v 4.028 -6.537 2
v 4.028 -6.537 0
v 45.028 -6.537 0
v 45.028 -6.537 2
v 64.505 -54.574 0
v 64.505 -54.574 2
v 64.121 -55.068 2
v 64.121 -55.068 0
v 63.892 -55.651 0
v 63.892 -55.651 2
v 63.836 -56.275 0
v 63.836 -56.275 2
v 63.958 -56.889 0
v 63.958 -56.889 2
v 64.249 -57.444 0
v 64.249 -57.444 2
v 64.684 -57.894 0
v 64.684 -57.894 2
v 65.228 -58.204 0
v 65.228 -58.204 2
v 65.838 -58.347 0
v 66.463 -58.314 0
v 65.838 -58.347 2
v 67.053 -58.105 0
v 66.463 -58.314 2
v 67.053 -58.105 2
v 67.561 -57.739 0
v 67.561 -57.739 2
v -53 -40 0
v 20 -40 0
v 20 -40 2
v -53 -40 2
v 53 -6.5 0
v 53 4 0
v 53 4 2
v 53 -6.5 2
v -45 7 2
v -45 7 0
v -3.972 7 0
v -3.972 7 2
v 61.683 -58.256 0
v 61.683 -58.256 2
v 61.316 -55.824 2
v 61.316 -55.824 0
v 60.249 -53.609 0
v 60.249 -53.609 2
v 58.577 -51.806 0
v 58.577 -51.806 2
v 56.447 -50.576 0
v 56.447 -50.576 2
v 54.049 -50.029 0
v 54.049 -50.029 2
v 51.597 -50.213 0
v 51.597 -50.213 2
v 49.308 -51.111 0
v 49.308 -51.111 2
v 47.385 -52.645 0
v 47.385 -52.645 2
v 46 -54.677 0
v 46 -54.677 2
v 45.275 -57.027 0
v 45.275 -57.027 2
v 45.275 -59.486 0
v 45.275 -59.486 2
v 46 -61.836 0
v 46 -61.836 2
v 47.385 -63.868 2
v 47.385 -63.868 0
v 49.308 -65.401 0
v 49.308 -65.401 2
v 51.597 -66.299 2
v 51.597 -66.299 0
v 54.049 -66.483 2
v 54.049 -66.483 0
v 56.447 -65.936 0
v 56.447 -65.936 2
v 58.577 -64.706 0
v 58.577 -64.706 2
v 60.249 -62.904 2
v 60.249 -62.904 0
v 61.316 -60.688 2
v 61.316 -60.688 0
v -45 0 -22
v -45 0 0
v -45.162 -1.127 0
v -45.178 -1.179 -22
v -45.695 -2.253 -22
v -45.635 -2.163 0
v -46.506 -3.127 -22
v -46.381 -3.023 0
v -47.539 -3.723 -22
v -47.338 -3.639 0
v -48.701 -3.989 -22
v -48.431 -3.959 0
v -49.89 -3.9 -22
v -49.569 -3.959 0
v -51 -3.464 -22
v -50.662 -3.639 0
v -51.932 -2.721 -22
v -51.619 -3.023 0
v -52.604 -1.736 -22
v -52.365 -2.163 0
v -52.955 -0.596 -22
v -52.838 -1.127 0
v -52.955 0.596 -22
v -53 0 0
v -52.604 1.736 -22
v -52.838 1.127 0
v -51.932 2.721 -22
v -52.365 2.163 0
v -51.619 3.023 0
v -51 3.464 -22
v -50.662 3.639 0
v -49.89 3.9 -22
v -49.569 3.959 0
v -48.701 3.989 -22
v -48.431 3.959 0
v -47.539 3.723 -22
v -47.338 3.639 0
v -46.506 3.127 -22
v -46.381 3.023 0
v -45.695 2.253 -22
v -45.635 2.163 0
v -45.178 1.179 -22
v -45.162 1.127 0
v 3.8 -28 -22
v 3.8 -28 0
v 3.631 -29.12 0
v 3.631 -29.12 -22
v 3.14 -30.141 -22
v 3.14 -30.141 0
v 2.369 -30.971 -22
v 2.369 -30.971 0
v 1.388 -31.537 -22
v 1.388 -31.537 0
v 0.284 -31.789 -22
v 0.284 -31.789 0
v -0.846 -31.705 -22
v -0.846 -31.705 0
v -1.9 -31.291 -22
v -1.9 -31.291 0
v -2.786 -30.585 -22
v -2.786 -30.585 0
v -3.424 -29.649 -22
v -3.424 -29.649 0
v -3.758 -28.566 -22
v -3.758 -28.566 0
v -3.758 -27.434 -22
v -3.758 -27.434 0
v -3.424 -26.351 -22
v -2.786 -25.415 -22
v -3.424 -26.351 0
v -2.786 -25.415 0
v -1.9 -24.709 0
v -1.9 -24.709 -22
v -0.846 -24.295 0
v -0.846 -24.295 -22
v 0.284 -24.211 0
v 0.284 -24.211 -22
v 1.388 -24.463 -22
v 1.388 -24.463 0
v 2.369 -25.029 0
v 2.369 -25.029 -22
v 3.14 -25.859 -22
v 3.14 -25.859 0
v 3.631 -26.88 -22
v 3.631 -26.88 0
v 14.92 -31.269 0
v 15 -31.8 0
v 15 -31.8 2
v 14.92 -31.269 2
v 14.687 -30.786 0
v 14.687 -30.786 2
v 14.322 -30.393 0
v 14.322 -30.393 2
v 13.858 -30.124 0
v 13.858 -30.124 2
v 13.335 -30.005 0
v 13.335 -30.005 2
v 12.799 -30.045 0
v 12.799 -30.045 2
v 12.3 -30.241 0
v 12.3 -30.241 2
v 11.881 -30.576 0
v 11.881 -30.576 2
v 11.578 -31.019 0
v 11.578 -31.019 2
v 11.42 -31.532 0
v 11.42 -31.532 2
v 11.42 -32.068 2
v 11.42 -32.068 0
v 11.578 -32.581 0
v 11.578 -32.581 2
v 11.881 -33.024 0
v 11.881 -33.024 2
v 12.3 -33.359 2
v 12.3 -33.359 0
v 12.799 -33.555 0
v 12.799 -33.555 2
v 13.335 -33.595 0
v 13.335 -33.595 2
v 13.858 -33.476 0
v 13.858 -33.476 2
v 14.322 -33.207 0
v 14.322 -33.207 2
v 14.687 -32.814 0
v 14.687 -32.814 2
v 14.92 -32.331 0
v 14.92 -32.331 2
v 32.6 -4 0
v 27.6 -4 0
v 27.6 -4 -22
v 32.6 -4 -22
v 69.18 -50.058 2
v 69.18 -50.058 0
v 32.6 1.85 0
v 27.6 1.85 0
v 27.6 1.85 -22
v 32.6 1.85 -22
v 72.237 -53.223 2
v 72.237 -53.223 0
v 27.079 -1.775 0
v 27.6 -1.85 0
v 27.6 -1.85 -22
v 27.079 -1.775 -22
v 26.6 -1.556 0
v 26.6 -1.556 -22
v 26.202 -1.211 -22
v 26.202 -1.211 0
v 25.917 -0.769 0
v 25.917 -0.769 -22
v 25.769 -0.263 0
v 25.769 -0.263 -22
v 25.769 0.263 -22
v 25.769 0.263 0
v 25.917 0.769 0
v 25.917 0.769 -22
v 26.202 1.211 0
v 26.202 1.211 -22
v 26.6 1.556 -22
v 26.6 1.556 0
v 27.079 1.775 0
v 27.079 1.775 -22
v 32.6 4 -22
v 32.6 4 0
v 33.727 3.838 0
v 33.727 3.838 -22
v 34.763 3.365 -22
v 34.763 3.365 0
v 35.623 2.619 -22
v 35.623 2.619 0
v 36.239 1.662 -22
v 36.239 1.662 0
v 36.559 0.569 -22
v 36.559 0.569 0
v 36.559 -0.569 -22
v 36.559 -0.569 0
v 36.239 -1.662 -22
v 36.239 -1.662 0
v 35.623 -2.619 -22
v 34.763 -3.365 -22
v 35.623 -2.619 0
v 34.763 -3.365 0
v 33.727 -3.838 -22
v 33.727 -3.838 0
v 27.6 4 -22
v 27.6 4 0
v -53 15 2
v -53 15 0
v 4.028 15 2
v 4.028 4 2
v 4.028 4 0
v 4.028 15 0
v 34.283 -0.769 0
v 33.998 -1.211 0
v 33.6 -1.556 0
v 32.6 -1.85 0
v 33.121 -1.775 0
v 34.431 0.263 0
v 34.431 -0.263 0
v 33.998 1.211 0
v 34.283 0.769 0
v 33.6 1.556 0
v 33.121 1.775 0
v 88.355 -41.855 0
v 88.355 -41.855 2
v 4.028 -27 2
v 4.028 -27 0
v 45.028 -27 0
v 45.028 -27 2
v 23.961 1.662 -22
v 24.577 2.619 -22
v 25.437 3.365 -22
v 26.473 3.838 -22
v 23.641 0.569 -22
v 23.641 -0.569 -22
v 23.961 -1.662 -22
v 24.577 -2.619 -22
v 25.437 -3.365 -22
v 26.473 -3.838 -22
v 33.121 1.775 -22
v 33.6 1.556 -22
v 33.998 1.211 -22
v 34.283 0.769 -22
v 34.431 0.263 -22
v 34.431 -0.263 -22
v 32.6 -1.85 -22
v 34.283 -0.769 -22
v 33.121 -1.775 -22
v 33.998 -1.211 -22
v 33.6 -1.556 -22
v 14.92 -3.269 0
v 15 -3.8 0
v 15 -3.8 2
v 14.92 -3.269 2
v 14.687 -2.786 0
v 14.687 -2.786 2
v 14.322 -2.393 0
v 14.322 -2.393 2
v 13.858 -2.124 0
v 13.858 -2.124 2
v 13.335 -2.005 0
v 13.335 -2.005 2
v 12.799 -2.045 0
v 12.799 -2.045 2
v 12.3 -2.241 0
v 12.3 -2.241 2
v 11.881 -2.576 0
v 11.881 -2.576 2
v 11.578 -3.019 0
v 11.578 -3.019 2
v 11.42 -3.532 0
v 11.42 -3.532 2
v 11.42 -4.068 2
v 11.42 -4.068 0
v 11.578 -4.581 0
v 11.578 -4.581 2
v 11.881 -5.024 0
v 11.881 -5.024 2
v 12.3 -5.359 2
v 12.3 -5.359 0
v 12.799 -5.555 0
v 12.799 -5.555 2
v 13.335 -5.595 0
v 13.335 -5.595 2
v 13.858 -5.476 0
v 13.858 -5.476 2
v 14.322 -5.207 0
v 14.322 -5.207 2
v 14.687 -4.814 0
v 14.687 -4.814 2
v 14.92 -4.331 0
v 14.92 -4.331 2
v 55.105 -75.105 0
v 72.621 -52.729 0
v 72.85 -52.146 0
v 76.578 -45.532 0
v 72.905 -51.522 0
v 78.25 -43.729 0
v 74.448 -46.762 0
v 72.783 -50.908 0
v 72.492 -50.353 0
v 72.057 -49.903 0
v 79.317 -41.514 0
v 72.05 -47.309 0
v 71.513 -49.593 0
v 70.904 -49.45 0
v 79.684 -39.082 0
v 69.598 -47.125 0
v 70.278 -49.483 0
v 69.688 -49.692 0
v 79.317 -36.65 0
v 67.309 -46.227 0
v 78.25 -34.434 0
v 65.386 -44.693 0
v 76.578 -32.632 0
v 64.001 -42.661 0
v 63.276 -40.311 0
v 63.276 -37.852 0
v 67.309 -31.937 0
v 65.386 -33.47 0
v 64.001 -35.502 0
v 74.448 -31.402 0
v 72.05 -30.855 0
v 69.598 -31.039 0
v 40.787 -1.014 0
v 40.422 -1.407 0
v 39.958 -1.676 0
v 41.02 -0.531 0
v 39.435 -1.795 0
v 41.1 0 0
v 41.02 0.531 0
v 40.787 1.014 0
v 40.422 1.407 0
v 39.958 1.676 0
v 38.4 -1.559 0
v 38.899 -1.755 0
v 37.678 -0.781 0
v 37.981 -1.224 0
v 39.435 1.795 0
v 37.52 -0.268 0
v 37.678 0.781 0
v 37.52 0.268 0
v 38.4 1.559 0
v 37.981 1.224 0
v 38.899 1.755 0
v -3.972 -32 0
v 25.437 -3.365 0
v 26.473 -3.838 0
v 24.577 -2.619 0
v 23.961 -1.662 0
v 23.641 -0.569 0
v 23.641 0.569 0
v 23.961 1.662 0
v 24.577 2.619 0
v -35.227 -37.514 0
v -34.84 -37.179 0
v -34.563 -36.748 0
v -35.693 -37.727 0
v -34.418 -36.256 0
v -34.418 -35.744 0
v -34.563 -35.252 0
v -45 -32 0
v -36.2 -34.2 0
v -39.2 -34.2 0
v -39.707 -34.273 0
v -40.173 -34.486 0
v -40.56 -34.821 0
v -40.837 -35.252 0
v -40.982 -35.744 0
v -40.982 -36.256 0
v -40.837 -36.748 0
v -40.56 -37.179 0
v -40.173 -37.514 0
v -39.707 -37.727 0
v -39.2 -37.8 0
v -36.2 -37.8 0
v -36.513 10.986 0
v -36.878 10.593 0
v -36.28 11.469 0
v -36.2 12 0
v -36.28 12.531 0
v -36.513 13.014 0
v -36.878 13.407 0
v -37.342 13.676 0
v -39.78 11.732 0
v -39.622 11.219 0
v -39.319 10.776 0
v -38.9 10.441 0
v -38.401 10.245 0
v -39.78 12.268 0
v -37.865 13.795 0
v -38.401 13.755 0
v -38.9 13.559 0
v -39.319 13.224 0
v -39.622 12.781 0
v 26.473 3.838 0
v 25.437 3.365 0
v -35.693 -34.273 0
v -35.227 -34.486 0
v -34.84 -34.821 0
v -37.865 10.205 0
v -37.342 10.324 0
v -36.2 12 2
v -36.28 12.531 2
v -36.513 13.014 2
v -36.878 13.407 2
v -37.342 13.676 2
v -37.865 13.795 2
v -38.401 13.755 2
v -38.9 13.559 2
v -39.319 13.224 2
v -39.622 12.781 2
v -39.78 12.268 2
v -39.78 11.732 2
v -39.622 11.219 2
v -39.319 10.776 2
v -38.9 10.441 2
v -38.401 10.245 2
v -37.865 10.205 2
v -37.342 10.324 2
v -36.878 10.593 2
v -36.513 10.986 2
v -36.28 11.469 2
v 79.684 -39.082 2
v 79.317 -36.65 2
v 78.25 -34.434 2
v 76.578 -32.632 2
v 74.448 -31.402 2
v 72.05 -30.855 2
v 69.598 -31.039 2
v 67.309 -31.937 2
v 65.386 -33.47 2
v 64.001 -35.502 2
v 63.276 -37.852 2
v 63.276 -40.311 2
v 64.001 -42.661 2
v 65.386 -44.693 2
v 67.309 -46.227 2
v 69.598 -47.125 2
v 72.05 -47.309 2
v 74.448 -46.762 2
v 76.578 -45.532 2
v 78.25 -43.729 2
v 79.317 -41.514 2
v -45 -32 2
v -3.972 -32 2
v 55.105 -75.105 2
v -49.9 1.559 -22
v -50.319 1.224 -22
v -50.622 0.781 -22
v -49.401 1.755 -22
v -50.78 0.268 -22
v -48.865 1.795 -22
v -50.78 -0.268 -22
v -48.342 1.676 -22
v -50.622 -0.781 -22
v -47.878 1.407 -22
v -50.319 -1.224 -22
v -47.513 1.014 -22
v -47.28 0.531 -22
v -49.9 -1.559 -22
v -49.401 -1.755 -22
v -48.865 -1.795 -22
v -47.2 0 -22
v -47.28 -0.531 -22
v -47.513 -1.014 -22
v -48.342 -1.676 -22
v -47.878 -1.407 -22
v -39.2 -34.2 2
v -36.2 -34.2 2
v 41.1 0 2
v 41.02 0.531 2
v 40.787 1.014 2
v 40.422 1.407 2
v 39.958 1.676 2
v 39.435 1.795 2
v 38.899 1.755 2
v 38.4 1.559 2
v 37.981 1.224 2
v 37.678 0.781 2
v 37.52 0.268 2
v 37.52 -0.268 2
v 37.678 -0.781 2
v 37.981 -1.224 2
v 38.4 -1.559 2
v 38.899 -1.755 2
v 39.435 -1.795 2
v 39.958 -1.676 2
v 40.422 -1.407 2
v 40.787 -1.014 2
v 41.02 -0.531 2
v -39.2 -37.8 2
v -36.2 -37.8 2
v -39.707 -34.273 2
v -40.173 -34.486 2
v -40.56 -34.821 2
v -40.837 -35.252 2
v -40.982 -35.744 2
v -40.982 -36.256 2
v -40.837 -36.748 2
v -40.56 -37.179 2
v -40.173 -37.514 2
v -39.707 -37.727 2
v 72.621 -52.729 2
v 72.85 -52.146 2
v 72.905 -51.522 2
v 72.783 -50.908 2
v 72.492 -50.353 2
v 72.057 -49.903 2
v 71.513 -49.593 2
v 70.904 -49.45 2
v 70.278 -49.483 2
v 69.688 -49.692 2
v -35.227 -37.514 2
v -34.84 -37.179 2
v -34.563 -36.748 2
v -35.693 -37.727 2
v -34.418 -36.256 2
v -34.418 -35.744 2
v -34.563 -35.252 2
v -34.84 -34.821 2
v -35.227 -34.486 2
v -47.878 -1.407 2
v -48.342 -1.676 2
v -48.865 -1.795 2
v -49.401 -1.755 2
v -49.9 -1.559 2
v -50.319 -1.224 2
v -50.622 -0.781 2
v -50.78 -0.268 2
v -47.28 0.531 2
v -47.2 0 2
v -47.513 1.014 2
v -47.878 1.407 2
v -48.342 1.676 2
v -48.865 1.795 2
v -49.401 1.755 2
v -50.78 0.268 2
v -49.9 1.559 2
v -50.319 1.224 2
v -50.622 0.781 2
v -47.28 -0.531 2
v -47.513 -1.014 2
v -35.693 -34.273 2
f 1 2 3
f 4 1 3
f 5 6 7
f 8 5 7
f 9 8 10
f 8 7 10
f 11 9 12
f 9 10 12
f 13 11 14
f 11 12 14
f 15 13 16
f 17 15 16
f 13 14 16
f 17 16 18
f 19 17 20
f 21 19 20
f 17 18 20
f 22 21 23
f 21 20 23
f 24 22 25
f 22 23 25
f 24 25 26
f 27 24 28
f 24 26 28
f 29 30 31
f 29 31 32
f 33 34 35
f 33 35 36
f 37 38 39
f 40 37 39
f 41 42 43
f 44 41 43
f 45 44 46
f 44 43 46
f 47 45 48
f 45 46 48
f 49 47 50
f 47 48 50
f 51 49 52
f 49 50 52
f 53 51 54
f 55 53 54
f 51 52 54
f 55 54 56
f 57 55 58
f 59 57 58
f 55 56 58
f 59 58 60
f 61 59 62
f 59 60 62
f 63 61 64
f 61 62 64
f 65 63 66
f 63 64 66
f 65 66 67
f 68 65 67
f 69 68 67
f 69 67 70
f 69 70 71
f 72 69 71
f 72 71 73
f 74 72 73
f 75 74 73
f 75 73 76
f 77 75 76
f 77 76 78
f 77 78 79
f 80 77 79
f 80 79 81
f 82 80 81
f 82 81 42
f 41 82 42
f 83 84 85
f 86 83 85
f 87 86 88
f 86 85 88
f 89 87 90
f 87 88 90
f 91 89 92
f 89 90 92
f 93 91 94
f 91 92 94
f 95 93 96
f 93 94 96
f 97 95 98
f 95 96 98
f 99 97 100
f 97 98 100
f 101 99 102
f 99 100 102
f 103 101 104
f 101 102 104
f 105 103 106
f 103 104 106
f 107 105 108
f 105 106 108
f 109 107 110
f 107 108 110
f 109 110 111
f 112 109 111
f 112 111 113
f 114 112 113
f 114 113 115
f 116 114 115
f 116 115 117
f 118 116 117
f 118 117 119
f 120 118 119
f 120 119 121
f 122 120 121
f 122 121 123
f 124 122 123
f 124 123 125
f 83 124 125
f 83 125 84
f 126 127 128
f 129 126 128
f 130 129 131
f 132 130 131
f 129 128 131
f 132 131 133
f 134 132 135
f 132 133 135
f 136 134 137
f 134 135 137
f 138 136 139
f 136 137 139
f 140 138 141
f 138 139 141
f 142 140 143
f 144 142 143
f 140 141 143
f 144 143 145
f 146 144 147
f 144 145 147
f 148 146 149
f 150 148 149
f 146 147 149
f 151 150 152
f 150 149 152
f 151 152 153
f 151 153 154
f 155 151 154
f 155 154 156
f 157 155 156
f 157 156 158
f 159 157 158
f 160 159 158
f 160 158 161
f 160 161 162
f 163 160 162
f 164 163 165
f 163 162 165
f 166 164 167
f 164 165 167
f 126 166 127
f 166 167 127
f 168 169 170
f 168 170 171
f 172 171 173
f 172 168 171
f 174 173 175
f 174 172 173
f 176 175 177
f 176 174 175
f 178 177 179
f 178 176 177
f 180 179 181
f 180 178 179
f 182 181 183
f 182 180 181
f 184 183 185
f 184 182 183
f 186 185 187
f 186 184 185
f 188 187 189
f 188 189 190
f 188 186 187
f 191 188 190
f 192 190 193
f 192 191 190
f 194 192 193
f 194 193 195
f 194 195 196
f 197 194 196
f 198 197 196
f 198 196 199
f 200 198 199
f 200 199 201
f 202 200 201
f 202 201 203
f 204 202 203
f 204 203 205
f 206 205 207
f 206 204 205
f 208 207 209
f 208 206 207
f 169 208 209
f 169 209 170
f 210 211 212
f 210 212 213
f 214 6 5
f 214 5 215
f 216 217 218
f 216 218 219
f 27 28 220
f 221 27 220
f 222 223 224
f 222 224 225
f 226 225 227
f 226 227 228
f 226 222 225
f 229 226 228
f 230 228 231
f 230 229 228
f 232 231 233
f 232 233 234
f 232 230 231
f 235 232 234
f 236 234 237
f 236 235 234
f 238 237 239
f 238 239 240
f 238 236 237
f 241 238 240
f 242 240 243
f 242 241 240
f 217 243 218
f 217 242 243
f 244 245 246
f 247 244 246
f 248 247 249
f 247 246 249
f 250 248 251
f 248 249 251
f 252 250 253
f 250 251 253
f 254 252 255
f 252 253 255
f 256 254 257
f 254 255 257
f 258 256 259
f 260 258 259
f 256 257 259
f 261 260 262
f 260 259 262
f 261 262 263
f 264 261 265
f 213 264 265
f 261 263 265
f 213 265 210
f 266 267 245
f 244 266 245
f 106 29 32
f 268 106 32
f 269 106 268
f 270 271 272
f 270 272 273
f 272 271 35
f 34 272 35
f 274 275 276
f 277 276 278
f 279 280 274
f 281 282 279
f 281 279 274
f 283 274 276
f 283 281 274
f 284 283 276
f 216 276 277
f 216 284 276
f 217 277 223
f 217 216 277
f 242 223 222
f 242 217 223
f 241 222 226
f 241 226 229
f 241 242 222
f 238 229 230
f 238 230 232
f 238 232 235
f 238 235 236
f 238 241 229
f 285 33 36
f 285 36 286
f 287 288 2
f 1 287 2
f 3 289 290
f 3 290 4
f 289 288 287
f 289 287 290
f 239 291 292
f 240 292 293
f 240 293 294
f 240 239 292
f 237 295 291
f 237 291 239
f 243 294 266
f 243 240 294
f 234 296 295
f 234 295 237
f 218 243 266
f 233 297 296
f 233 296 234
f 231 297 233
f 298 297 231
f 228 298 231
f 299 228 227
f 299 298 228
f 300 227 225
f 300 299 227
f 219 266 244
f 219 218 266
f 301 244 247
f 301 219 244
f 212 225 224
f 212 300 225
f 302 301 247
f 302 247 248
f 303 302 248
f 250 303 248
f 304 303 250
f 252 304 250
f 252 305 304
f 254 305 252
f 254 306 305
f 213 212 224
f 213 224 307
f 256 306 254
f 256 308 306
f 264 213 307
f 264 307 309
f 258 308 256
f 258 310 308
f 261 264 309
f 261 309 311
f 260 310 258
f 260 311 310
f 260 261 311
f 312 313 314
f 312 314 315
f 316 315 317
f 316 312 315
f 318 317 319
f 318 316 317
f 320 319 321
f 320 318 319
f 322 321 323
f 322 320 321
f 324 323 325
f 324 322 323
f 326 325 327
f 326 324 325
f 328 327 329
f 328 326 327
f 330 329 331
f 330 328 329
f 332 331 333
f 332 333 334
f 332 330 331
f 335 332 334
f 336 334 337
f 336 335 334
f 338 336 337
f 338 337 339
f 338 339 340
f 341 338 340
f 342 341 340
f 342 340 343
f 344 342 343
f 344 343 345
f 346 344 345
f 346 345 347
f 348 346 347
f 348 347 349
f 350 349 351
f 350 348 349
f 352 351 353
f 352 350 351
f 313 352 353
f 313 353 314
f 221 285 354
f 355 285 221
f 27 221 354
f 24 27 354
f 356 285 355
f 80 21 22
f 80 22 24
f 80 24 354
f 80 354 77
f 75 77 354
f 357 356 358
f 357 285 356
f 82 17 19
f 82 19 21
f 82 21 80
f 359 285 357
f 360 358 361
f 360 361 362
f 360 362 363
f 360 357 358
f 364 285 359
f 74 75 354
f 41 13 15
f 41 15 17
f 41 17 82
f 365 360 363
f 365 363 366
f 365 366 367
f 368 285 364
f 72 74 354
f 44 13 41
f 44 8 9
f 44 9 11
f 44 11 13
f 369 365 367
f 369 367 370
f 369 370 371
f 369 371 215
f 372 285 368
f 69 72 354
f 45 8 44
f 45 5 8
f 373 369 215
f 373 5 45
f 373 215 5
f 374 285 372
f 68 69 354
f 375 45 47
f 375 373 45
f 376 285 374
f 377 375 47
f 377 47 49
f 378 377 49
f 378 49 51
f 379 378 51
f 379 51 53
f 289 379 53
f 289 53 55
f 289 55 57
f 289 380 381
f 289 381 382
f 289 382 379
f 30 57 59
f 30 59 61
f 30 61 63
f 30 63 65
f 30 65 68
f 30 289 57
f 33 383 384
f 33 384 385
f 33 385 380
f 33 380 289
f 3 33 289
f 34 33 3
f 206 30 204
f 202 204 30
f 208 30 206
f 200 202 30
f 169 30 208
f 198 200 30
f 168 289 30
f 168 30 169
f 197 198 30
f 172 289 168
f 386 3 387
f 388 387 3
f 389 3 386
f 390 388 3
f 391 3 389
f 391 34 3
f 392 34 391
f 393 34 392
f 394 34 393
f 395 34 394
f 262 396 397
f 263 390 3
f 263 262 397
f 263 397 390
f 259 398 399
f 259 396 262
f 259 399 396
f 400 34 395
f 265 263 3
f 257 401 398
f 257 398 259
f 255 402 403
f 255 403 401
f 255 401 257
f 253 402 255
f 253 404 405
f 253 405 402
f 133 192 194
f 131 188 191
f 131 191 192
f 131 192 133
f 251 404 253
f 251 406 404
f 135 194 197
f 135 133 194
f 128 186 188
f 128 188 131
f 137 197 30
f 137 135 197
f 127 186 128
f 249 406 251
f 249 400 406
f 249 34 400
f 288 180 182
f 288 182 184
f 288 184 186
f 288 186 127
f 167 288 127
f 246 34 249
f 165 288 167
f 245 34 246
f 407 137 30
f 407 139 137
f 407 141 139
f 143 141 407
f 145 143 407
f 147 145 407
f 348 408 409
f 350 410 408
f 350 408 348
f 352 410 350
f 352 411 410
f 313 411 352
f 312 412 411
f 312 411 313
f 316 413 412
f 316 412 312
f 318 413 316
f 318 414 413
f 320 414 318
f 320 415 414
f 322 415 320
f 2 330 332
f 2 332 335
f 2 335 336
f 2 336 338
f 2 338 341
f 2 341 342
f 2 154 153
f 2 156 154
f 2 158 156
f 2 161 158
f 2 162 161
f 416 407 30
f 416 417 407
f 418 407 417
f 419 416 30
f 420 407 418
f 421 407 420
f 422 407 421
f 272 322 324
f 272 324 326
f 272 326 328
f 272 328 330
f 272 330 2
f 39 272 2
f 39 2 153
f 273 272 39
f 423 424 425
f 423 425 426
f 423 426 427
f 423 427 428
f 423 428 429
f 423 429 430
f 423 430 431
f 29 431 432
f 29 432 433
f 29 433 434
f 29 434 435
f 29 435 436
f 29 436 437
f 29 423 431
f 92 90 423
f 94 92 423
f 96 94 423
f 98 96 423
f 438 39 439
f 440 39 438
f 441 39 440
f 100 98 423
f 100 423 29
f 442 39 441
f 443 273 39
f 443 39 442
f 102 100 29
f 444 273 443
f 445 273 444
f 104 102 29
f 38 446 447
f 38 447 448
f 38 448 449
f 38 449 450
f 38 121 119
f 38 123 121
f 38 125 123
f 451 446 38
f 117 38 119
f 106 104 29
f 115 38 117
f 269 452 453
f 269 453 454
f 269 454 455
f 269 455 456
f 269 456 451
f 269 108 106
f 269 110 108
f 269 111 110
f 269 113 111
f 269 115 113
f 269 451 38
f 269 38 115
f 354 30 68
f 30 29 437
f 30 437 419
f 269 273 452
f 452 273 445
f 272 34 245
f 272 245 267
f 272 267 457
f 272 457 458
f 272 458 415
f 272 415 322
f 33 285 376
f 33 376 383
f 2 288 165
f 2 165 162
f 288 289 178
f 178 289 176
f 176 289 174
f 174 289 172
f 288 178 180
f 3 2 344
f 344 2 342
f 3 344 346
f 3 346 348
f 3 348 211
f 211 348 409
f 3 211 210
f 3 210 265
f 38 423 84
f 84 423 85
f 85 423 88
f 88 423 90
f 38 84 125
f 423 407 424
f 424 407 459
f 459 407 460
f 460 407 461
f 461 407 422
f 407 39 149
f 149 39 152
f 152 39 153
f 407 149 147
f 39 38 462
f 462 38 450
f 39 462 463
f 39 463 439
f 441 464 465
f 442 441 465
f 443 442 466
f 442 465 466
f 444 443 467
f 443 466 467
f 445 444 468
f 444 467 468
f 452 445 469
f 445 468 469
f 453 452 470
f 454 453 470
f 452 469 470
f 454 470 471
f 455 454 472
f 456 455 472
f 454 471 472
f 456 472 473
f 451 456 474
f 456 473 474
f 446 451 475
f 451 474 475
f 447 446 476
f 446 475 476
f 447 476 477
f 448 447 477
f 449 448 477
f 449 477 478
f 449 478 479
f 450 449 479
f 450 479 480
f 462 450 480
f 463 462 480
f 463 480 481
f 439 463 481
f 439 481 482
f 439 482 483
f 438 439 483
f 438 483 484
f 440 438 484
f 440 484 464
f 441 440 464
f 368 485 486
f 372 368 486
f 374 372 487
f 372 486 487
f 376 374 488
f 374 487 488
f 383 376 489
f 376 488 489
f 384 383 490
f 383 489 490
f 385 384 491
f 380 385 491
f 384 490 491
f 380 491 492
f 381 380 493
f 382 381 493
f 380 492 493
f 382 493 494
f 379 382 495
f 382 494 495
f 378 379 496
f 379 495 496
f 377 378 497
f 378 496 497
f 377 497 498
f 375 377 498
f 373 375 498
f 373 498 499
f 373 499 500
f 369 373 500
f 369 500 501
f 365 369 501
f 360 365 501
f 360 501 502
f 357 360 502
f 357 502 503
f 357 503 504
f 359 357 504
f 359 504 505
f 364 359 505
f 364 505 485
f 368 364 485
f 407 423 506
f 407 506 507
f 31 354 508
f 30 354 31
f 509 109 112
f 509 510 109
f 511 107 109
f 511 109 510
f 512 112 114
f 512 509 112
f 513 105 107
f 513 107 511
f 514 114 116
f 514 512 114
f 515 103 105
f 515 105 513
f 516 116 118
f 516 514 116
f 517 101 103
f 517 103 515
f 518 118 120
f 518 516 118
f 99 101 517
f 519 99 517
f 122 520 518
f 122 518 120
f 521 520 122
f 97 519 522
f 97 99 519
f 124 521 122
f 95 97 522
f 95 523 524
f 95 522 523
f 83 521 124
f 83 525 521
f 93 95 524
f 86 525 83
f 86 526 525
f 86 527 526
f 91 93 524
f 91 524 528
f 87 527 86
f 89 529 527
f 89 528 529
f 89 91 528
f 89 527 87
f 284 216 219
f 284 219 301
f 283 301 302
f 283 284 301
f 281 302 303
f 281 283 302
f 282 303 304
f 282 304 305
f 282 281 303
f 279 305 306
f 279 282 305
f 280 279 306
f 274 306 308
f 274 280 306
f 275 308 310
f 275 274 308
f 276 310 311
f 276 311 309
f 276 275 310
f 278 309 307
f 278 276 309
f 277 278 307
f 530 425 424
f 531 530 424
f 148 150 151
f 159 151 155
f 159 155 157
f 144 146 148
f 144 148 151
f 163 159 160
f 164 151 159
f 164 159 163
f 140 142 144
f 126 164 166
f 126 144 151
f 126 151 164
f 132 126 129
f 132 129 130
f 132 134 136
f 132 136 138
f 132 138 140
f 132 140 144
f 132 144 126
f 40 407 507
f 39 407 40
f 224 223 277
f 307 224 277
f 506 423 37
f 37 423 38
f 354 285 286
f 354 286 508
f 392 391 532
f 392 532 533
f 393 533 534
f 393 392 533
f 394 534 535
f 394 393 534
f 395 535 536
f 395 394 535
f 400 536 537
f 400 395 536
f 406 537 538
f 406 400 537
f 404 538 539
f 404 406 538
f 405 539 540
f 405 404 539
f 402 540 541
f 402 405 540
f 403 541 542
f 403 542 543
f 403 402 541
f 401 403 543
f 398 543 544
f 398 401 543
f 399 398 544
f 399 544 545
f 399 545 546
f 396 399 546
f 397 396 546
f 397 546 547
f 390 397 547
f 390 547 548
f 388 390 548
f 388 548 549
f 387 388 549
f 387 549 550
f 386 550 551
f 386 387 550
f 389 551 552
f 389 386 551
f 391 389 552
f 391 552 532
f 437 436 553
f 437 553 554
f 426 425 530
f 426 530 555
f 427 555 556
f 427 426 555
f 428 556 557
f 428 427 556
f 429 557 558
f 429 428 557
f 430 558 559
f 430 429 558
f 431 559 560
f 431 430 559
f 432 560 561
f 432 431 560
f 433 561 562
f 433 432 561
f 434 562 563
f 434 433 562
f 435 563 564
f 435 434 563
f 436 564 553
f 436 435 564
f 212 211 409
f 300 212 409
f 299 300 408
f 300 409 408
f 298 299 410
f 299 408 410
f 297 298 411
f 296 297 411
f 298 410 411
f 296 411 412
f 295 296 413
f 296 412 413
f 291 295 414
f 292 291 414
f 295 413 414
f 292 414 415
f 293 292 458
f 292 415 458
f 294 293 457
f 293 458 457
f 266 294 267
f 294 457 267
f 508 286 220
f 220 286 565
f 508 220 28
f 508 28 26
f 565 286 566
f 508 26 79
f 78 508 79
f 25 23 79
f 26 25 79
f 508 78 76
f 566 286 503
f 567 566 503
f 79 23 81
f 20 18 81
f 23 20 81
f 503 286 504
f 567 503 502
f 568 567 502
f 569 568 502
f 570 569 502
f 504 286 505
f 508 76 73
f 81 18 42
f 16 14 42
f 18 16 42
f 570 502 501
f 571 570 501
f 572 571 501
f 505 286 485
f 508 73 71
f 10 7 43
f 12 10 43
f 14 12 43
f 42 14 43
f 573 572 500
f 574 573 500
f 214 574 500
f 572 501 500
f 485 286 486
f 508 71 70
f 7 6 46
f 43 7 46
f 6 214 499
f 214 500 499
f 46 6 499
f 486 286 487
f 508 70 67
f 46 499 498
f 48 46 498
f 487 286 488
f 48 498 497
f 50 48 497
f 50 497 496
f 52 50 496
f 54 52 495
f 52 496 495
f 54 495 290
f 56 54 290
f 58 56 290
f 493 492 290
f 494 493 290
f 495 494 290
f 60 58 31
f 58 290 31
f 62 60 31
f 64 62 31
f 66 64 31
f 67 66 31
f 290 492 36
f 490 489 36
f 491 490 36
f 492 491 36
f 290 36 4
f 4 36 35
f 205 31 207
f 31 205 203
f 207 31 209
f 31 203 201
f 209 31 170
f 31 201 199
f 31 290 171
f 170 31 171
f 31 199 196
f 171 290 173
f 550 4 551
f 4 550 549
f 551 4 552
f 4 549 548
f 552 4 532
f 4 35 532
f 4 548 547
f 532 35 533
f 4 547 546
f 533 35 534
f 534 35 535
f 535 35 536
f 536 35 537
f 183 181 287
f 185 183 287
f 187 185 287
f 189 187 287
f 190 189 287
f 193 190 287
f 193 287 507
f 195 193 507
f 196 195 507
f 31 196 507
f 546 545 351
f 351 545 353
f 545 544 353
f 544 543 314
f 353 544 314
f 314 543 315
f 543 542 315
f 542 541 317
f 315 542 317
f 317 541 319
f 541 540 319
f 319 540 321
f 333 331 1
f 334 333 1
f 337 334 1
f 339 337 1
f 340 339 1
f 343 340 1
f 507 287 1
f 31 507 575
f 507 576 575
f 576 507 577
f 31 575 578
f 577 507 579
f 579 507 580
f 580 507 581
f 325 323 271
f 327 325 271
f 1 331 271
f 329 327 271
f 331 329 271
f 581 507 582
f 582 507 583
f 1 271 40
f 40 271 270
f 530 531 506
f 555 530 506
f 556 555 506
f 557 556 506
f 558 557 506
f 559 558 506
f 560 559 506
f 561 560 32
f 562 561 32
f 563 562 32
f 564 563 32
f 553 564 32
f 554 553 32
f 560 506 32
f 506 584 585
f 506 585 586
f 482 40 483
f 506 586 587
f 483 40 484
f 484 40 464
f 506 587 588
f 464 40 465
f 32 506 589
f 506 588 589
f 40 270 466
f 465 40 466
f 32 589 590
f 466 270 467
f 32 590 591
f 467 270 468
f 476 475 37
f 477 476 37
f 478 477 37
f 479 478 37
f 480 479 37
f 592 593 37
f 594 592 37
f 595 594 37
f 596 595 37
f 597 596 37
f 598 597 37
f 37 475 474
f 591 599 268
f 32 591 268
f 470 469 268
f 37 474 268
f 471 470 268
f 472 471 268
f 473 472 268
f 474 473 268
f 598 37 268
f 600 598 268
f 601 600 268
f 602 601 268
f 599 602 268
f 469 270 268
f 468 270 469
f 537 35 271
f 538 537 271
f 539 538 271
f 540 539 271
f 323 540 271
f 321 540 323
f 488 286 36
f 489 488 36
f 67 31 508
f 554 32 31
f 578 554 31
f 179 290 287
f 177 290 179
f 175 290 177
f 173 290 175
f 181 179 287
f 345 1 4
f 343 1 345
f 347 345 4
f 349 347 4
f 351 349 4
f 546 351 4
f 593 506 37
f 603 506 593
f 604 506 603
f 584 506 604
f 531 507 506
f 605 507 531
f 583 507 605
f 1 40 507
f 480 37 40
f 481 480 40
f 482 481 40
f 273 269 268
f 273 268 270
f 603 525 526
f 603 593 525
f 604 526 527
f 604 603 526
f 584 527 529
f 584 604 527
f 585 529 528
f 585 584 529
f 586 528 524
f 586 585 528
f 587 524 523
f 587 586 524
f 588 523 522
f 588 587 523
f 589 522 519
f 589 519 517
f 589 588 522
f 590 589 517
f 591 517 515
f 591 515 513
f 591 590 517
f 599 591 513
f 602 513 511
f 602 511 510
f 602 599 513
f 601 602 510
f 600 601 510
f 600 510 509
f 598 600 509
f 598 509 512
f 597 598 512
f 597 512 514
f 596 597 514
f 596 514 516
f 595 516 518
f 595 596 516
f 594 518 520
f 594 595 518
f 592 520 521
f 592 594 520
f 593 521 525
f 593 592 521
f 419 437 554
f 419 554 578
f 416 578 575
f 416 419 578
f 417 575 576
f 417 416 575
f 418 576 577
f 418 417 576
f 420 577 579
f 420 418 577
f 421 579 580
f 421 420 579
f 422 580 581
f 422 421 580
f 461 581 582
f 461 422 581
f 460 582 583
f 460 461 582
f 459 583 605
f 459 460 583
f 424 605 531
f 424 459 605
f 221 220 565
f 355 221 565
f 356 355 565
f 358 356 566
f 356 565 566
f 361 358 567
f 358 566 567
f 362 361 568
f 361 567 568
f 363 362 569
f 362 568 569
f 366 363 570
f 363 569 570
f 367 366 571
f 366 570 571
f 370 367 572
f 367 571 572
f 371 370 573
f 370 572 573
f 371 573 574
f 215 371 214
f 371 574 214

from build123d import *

# Parameters (mm, degrees)
SKETCH_R        = 1.8
SKETCH_W        = 41.028241
SKETCH_H        = 39
SKETCH_W_2      = 41
SKETCH_H_2      = 20.463
PAD_DEPTH       = 2
SKETCH001_R     = 3.8
SKETCH001_R_2   = 4
SKETCH001_R_3   = 1.8
PAD001_DEPTH    = 22
SKETCH002_R     = 8.25
POCKET_DEPTH    = 5
SKETCH003_R     = 1.8
POCKET001_DEPTH = 5
SKETCH004_W     = 53.310085
SKETCH004_H     = 13.854095
POCKET002_DEPTH = 5


with BuildPart() as part:
    # Sketch → Pad (new body)
    with BuildSketch(Plane.XY):
        Polygon((-53, 15), (53, 15), (53, -6.5), (88.355343, -41.855343), (55.105343, -75.105343), (20, -40), (-53, -40), align=None)
        with Locations((-49, 0)):
            Circle(SKETCH_R, mode=Mode.SUBTRACT)
        with Locations((39.3, 0)):
            Circle(SKETCH_R, mode=Mode.SUBTRACT)
        with Locations((13.2, -31.8)):
            Circle(SKETCH_R, mode=Mode.SUBTRACT)
        with Locations((13.2, -3.8)):
            Circle(SKETCH_R, mode=Mode.SUBTRACT)
        with Locations((-24.485879, -12.5)):
            Rectangle(SKETCH_W, SKETCH_H, mode=Mode.SUBTRACT)
        with Locations((24.528241, -16.768476)):
            Rectangle(SKETCH_W_2, SKETCH_H_2, mode=Mode.SUBTRACT)
        with BuildLine():
            ThreePointArc((-39.199998, -34.2), (-41, -36), (-39.199998, -37.8))
            Line((-39.199998, -37.8), (-36.200009, -37.8))
            ThreePointArc((-36.200009, -37.8), (-34.4, -36.000004), (-36.2, -34.2))
            Line((-39.199998, -34.2), (-36.2, -34.2))
        make_face(mode=Mode.SUBTRACT)
    extrude(amount=PAD_DEPTH)

    # Sketch001 → Pad001 (new body)
    with BuildSketch(Plane(origin=(0, 0, 0), x_dir=(1, 0, 0), z_dir=(0, 0, -1))):
        with Locations((0, 28)):
            Circle(SKETCH001_R)
        with Locations((-49, 0)):
            Circle(SKETCH001_R_2)
        with Locations((-49, 0)):
            Circle(SKETCH001_R_3, mode=Mode.SUBTRACT)
        with BuildLine():
            ThreePointArc((27.599984, 4), (23.6, -8e-06), (27.600001, -4))
            Line((27.600001, -4), (32.6, -4))
            ThreePointArc((32.6, -4), (36.6, 1e-05), (32.59998, 4))
            Line((27.599984, 4), (32.59998, 4))
        make_face()
        with BuildLine():
            ThreePointArc((27.599995, 1.85), (25.75, -3e-06), (27.600001, -1.85))
            Line((27.600001, -1.85), (32.6, -1.85))
            ThreePointArc((32.6, -1.85), (34.45, 4e-06), (32.599991, 1.85))
            Line((27.599995, 1.85), (32.599991, 1.85))
        make_face(mode=Mode.SUBTRACT)
    extrude(amount=PAD001_DEPTH)

    # Sketch002 → Pocket (cut)
    with BuildSketch(Plane.XY.offset(2)):
        with Locations((53.4328, -58.256155)):
            Circle(SKETCH002_R)
        with Locations((71.433789, -39.081839)):
            Circle(SKETCH002_R)
        with BuildLine():
            ThreePointArc((64.504552, -54.573607), (64.450253, -57.684403), (67.561049, -57.738702))
            Line((67.561049, -57.738702), (72.236758, -53.223423))
            ThreePointArc((72.236758, -53.223423), (72.291056, -50.112627), (69.18026, -50.058329))
            Line((64.504552, -54.573607), (69.18026, -50.058329))
        make_face()
    extrude(amount=-POCKET_DEPTH, mode=Mode.SUBTRACT)

    # Sketch003 → Pocket001 (cut)
    with BuildSketch(Plane.XY.offset(2)):
        with Locations((-38, 12)):
            Circle(SKETCH003_R)
    extrude(amount=-POCKET001_DEPTH, mode=Mode.SUBTRACT)

    # Sketch004 → Pocket002 (cut)
    with BuildSketch(Plane.XY.offset(2)):
        with Locations((30.683283, 10.927048)):
            Rectangle(SKETCH004_W, SKETCH004_H)
    extrude(amount=-POCKET002_DEPTH, mode=Mode.SUBTRACT)


solid = part.part
